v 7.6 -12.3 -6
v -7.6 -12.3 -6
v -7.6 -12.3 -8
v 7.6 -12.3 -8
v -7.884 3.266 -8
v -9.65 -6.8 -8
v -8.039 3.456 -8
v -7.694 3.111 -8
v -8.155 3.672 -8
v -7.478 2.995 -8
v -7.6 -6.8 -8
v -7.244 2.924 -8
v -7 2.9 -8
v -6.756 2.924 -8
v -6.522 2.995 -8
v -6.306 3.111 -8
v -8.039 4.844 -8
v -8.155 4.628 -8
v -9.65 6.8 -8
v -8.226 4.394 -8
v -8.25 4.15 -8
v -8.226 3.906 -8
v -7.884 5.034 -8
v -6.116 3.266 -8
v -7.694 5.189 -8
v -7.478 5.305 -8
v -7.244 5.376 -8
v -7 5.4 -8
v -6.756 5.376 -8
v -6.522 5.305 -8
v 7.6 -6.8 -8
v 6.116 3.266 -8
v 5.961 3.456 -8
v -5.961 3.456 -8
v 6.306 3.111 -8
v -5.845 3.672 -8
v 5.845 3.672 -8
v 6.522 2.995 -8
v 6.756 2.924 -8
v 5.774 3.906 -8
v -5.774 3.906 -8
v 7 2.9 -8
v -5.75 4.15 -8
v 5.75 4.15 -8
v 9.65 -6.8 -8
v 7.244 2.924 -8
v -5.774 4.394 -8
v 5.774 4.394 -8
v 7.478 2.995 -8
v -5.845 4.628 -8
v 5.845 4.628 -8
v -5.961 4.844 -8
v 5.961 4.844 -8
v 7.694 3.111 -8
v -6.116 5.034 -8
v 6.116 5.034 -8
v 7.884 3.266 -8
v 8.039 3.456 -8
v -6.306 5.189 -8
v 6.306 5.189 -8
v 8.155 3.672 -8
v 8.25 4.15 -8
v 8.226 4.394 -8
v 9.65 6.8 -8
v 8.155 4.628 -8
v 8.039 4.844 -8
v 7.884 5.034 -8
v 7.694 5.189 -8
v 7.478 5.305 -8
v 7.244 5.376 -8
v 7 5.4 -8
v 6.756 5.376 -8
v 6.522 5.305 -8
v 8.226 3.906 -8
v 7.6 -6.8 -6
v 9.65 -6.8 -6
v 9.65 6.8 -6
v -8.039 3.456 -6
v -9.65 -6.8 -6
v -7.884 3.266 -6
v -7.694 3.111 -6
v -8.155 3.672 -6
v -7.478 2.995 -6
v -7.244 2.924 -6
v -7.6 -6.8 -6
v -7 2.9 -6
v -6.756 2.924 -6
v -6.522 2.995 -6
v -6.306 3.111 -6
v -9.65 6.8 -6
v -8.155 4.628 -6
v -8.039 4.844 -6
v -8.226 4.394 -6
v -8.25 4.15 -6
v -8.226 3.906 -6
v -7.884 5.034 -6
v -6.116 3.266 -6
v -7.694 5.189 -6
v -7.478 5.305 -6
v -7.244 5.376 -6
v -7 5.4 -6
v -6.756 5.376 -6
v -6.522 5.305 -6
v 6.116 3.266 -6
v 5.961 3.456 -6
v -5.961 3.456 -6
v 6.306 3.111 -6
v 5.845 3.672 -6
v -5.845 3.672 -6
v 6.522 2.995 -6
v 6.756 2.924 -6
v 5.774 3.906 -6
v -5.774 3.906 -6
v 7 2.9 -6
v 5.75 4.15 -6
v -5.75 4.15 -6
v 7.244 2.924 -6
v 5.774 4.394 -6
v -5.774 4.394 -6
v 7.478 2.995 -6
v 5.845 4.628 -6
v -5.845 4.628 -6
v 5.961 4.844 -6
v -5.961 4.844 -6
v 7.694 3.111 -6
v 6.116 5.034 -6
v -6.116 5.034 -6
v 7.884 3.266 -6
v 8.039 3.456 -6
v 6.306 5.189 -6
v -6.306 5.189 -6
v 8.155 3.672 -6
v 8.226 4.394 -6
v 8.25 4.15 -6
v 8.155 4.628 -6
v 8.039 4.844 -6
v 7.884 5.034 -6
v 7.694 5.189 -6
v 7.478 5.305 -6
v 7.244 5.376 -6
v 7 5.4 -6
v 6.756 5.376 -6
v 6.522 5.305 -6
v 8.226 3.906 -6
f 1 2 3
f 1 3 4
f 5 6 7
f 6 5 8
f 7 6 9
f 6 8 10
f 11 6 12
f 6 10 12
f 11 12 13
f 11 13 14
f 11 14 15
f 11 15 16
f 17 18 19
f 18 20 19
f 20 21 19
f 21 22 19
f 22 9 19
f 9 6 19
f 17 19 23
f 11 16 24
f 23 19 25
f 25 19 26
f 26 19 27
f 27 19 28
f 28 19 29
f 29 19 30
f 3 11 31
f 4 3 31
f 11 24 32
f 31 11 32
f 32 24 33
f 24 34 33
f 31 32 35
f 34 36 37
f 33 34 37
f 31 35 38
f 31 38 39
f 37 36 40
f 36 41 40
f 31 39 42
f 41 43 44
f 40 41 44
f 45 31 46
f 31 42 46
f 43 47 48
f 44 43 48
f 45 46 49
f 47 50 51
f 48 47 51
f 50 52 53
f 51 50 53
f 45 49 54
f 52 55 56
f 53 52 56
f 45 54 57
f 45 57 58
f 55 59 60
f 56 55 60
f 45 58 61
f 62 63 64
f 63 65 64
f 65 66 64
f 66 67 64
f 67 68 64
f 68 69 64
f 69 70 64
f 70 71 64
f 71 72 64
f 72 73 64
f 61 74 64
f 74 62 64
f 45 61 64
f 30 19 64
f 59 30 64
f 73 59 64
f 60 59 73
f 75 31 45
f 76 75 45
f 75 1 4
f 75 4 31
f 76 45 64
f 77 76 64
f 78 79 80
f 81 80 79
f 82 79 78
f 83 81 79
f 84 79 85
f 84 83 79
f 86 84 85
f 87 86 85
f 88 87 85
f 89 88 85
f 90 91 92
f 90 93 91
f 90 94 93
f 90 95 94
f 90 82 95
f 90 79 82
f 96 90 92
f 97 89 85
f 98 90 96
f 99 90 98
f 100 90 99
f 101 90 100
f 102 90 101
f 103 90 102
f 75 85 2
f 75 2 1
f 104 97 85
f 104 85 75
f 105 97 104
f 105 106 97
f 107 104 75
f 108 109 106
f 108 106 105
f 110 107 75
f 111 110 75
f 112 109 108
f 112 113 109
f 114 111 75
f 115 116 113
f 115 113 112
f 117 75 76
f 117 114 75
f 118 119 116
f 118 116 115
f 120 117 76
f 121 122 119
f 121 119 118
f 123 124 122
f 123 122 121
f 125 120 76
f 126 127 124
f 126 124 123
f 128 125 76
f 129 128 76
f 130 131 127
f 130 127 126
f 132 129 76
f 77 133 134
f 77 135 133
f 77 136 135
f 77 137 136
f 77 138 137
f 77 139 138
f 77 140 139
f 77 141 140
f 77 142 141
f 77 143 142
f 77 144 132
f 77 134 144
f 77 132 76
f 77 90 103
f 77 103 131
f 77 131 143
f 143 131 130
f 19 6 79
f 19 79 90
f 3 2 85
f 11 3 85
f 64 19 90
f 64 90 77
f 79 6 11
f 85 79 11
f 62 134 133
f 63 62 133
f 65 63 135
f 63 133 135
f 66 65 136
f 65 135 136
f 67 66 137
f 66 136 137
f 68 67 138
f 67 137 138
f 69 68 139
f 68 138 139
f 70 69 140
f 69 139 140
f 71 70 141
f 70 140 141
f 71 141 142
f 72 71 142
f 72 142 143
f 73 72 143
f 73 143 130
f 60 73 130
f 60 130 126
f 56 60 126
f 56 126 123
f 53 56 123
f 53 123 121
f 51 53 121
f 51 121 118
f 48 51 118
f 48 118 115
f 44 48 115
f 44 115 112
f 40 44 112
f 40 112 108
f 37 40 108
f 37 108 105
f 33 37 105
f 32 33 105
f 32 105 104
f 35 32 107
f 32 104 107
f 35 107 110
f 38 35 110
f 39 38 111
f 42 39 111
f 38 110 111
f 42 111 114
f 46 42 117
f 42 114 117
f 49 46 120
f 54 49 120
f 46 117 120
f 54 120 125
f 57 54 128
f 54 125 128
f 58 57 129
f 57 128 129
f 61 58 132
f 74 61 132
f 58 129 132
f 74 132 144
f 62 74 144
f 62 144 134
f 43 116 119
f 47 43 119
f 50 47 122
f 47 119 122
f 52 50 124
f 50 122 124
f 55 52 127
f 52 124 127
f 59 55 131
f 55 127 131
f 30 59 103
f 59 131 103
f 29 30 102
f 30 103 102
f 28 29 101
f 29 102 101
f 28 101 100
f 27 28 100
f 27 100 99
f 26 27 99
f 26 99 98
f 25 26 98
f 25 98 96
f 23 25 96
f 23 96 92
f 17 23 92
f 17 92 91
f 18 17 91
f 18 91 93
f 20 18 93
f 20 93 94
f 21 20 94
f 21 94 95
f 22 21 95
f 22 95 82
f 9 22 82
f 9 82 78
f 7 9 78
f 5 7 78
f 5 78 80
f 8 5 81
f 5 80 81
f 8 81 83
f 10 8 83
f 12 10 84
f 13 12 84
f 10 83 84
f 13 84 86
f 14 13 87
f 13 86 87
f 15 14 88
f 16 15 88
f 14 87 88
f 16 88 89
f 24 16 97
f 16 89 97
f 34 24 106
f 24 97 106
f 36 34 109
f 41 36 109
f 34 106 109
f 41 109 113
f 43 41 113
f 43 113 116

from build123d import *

# Parameters (mm, degrees)
SKETCH003_W     = 19.3
SKETCH003_H     = 13.6
PAD002_DEPTH    = 2
SKETCH004_W     = 15.2
SKETCH004_H     = 5.5
PAD003_DEPTH    = 2
SKETCH005_R     = 1.25
POCKET001_DEPTH = 5


with BuildPart() as part:
    # Sketch003 → Pad002 (new body)
    with BuildSketch(Plane.XY):
        Rectangle(SKETCH003_W, SKETCH003_H)
    extrude(amount=PAD002_DEPTH)

    # Sketch004 (on Face6 of Pad002) → Pad003 (join)
    with BuildSketch(Plane.XY.offset(2)):
        with Locations((0, -9.55)):
            Rectangle(SKETCH004_W, SKETCH004_H)
    extrude(amount=-PAD003_DEPTH)

    # Sketch005 (on Face5 of Pad003) → Pocket001 (cut)
    with BuildSketch(Plane.XY.offset(2)):
        with Locations((-7, 4.15)):
            Circle(SKETCH005_R)
        with Locations((7, 4.15)):
            Circle(SKETCH005_R)
    extrude(amount=-POCKET001_DEPTH, mode=Mode.SUBTRACT)


with BuildPart() as part_1:
    # Body001 placement: moved
    add(part.part.moved(Location((0, 0, -8))))


solid = part_1.part
